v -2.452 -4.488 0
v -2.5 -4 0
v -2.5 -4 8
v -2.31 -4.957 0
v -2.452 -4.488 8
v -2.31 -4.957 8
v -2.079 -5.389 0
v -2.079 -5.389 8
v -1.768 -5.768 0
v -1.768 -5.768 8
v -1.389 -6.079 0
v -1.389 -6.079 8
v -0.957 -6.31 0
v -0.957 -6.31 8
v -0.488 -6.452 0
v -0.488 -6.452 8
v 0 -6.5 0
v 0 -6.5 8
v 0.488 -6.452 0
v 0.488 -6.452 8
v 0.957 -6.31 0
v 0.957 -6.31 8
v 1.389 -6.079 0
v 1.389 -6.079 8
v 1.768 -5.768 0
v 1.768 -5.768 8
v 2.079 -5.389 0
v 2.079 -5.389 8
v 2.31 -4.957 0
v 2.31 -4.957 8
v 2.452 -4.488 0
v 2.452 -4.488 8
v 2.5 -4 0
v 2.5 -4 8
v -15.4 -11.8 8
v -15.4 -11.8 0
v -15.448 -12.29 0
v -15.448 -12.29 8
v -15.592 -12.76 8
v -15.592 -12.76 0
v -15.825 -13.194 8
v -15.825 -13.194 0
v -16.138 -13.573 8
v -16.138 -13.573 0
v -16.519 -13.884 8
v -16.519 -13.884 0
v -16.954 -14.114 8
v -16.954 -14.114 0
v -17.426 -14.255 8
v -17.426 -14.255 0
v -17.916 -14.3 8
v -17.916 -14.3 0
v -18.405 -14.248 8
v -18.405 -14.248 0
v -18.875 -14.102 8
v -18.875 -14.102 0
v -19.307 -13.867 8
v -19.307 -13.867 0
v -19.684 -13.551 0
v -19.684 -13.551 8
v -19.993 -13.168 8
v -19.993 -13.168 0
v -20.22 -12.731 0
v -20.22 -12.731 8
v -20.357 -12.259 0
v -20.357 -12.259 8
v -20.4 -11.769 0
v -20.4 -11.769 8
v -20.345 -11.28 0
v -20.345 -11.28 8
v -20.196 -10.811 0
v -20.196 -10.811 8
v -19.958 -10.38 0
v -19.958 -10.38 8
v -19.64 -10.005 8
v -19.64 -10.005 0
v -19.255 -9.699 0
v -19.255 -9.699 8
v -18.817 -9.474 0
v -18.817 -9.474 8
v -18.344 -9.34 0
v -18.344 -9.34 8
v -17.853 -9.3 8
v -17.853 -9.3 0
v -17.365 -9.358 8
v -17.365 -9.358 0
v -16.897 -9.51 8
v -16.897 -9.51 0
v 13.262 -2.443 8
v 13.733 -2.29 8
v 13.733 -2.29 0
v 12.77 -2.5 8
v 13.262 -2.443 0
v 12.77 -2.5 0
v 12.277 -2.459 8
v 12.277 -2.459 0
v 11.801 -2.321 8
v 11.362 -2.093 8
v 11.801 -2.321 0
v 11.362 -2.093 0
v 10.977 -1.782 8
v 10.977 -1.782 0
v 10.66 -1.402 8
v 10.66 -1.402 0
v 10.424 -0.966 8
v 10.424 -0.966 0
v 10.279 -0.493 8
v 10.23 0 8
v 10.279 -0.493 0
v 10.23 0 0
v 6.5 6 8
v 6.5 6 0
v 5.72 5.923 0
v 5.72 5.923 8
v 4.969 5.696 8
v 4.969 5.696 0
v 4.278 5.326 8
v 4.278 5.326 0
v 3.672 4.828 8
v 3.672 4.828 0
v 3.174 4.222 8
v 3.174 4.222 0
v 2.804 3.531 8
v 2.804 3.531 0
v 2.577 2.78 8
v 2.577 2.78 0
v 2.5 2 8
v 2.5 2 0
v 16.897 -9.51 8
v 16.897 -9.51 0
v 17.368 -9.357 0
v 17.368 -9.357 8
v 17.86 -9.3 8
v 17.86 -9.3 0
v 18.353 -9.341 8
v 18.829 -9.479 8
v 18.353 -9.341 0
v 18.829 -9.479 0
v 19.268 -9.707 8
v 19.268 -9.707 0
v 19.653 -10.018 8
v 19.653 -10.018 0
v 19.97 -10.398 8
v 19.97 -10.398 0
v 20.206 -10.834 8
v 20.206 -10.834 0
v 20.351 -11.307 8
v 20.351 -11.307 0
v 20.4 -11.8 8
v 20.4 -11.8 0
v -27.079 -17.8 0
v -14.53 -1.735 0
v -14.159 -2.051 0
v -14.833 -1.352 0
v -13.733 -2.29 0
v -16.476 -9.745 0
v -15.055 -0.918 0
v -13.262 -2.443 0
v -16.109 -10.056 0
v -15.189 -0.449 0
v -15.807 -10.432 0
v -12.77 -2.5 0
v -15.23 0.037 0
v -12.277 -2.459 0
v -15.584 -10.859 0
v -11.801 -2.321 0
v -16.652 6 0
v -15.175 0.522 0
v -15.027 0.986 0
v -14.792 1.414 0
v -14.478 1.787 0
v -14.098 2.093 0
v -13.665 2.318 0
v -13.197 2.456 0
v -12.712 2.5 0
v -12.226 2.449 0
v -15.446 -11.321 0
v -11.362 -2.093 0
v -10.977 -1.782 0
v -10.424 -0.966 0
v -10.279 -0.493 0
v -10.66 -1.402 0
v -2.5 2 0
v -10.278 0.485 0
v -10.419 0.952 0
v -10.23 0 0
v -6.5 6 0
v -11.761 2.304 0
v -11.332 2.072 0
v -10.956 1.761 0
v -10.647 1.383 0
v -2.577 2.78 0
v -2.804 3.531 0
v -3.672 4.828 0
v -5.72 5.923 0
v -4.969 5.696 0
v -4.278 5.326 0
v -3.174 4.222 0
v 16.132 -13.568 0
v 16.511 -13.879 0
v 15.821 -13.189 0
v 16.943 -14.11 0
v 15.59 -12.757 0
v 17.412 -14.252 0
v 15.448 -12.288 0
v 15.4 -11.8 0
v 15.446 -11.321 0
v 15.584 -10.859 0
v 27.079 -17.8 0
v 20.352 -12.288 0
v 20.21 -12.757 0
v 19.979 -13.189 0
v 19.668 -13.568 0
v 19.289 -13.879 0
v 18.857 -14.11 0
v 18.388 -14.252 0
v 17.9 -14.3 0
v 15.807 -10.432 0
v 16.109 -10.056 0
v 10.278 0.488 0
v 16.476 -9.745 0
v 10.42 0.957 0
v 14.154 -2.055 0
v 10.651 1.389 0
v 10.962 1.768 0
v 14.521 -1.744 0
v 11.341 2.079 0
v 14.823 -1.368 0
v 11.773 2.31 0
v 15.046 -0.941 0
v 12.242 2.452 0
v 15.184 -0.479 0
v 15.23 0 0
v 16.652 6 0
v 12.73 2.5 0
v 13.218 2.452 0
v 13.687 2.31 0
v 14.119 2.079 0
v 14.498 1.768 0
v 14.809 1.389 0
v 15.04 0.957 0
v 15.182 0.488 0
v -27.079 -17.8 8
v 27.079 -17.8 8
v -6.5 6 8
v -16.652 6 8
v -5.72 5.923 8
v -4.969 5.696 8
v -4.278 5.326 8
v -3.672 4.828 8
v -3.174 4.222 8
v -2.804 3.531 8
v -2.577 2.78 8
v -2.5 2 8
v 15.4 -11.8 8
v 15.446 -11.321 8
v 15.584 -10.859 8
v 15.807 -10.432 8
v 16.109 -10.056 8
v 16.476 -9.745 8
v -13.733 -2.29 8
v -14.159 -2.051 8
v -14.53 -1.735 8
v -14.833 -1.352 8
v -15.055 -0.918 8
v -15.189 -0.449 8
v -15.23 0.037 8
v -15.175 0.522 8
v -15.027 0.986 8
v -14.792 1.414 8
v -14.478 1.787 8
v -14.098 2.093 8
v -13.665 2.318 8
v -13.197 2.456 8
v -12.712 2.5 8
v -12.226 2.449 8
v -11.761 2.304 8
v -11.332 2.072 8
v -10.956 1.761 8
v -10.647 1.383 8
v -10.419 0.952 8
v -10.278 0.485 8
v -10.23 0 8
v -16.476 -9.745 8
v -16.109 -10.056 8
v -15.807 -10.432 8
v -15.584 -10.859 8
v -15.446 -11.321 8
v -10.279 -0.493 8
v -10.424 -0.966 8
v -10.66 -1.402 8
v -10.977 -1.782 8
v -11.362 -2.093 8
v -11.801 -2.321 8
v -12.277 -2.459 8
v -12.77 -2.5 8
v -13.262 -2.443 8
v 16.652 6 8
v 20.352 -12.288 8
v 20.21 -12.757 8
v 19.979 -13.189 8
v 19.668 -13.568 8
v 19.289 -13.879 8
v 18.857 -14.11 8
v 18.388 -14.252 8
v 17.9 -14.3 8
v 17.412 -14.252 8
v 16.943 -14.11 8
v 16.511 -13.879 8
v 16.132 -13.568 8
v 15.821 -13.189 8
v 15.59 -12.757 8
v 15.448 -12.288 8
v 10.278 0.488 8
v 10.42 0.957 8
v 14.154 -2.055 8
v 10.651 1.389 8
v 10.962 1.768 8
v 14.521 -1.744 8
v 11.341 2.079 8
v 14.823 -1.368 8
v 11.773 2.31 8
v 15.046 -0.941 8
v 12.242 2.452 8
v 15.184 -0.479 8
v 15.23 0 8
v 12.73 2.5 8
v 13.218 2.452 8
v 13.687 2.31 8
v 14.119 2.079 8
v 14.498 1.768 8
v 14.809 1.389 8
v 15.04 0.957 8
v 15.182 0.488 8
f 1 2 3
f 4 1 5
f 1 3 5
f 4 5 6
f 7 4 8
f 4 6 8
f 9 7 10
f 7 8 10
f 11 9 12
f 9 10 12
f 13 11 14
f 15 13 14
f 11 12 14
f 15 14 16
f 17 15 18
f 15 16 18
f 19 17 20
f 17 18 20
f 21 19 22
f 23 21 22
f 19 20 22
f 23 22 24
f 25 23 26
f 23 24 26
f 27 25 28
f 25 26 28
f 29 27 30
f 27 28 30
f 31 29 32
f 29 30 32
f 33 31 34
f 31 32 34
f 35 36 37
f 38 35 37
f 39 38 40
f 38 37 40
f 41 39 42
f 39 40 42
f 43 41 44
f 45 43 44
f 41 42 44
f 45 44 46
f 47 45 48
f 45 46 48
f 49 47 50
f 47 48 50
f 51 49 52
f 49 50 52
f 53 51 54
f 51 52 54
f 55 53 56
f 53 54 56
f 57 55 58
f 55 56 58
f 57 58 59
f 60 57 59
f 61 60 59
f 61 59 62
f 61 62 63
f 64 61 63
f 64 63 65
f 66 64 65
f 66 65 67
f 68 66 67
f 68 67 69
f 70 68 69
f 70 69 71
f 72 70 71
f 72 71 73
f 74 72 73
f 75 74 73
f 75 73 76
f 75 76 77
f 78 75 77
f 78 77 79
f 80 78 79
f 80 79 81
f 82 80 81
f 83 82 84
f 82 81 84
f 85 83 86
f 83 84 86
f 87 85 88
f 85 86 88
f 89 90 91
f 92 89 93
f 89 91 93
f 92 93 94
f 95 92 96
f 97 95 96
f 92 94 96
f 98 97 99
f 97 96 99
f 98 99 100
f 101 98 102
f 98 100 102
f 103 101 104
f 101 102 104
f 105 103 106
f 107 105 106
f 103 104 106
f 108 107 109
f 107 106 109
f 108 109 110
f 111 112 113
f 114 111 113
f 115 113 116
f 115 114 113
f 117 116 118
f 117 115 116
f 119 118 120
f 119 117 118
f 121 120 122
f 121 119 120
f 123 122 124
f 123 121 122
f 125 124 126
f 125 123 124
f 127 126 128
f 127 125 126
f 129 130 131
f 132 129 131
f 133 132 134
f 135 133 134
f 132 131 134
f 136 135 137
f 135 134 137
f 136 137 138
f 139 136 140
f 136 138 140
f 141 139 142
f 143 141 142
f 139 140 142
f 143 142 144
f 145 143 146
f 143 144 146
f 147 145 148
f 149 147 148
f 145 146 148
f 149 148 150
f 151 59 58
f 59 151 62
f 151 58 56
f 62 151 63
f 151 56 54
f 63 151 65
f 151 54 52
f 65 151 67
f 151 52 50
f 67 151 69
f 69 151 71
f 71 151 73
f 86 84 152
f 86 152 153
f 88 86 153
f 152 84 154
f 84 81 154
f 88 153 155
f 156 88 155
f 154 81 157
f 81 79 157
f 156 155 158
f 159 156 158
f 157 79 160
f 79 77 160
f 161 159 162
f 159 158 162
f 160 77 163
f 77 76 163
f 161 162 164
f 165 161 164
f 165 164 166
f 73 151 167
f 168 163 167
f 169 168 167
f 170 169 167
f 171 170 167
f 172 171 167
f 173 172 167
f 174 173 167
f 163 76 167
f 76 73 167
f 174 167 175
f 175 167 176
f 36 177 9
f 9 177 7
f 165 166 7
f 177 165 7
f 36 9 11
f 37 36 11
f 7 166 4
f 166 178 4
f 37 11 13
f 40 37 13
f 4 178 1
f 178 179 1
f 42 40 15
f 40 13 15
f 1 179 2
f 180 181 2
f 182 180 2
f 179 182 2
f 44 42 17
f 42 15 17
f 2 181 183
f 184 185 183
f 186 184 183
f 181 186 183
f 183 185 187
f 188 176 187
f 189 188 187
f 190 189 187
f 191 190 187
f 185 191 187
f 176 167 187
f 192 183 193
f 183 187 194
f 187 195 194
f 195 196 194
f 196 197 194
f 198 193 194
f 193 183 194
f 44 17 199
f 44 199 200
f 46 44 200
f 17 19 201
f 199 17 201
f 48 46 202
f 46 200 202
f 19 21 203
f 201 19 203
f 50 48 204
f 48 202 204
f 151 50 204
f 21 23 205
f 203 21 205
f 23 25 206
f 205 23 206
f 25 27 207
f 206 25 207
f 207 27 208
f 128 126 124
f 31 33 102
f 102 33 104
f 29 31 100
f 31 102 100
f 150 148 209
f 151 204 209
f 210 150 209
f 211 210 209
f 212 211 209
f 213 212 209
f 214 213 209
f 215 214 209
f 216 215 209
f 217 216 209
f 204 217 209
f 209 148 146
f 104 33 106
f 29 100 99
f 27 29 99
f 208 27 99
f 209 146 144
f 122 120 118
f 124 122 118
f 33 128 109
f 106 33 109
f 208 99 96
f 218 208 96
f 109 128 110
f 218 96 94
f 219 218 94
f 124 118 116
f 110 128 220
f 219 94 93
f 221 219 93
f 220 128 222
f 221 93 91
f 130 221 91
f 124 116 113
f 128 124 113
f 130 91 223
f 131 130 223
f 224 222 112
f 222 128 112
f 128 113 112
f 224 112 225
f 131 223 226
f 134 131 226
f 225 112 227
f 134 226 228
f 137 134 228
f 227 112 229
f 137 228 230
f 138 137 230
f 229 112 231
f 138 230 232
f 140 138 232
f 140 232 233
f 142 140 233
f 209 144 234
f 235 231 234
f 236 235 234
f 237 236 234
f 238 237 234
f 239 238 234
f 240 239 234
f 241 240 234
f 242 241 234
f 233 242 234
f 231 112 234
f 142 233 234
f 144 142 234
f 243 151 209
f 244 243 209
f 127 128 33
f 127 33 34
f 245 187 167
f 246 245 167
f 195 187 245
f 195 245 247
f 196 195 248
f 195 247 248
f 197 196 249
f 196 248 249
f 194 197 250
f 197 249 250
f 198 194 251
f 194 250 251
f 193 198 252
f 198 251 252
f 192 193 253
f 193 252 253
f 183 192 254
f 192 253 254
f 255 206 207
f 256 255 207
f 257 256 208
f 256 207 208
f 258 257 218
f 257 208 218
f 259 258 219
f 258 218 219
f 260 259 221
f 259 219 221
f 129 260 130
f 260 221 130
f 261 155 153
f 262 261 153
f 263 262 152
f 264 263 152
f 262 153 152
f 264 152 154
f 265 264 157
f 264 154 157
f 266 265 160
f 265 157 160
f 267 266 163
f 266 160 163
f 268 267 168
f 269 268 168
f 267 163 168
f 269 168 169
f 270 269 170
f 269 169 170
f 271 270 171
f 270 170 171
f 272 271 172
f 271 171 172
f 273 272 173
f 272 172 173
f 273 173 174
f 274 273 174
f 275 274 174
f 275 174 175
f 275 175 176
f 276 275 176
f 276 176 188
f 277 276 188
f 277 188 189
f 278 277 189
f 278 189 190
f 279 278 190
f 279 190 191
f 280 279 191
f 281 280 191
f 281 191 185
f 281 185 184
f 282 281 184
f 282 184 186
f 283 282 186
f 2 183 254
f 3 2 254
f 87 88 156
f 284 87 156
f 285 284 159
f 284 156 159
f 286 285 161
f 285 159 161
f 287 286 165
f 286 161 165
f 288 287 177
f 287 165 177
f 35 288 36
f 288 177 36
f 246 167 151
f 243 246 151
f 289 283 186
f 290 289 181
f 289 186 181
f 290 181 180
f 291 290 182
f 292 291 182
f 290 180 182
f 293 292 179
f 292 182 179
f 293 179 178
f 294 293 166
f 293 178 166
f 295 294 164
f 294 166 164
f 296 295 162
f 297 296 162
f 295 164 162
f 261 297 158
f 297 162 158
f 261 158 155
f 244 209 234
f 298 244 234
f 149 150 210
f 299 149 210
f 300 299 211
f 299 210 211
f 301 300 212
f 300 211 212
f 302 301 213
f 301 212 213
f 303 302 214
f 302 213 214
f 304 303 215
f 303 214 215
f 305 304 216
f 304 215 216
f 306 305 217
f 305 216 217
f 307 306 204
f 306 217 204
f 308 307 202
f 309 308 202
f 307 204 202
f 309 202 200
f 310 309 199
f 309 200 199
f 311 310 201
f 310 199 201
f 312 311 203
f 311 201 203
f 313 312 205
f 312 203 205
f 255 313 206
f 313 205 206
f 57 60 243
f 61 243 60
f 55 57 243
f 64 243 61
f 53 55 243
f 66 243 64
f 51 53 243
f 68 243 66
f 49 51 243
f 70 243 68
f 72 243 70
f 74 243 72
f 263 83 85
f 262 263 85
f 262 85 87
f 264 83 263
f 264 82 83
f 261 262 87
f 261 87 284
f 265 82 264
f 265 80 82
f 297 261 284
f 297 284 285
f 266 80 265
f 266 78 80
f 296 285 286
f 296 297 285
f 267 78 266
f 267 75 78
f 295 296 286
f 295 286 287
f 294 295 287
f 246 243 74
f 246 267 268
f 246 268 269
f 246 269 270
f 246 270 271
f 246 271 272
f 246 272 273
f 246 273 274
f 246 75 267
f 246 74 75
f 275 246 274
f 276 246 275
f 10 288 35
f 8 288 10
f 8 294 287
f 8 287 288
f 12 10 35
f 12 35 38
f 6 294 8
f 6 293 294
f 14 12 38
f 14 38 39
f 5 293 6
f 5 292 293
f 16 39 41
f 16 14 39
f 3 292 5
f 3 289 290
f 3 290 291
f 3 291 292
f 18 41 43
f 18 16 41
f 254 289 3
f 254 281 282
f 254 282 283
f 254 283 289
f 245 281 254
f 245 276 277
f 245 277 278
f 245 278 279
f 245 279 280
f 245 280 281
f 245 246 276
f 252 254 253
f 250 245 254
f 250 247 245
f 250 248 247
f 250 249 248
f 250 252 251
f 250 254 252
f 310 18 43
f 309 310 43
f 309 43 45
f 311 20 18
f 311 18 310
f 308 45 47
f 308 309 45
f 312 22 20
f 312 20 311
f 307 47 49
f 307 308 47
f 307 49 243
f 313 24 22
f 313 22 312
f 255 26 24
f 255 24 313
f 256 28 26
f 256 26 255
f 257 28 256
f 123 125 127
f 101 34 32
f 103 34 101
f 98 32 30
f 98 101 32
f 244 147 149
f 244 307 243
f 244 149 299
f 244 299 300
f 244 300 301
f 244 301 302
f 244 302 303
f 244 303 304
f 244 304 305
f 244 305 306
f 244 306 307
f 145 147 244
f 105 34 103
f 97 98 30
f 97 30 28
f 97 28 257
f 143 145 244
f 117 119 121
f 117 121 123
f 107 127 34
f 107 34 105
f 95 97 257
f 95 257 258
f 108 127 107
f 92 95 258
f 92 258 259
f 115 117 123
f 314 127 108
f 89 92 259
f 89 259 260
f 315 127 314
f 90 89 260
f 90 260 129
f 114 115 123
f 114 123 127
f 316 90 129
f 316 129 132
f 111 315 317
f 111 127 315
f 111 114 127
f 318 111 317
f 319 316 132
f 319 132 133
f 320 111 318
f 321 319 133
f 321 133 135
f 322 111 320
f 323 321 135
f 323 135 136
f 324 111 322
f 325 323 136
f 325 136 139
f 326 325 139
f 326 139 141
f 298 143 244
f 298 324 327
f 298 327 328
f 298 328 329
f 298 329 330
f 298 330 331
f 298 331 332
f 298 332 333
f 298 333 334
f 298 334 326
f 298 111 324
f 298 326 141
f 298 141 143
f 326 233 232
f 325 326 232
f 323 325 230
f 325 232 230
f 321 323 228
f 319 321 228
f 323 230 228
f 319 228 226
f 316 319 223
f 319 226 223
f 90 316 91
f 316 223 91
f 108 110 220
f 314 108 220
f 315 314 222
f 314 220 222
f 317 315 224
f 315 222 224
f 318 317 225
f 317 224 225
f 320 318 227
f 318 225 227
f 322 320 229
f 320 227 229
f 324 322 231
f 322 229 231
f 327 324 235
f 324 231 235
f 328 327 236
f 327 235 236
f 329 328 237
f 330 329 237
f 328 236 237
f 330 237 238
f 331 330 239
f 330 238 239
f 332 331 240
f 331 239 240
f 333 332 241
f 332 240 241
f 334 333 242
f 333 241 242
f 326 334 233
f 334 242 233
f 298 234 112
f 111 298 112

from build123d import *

# Parameters (mm, degrees)
F1_DEPTH = 13
F2_W     = 5
F2_H     = 13
F3_DEPTH = 10
F5_DEPTH = 25
F6_R     = 4
F7_DEPTH = 5


with BuildPart() as f1:
    # F0 (on Top) → F1 (new body)
    with BuildSketch(Plane.XY):
        Polygon((16.6518093675, 6), (-16.6518093675, 6), (-27.0794364862, -17.8), (27.0794364862, -17.8), align=None)
        with BuildLine():
            Line((-16.8967314602, -9.5101414373), (-13.7332685398, -2.2898585627))
            ThreePointArc((-13.7332685398, -2.2898585627), (-14.0978137027, 2.0926265015), (-10.23, 0))
            Line((-10.23, 0), (10.23, 0))
            ThreePointArc((10.23, 0), (12.73, 2.5), (15.23, 0))
            ThreePointArc((15.23, 0), (14.8226265015, -1.3678137027), (13.7332685398, -2.2898585627))
            Line((13.7332685398, -2.2898585627), (16.8967314602, -9.5101414373))
            ThreePointArc((16.8967314602, -9.5101414373), (19.2678137027, -9.7073734985), (20.4, -11.8))
            ThreePointArc((20.4, -11.8), (17.9, -14.3), (15.4, -11.8))
            Line((15.4, -11.8), (-15.4, -11.8))
            ThreePointArc((-15.4, -11.8), (-19.9926265015, -13.1678137027), (-16.8967314602, -9.5101414373))
        make_face(mode=Mode.SUBTRACT)
        with BuildLine():
            ThreePointArc((-10.23, 0), (-11.3621862973, -2.0926265015), (-13.7332685398, -2.2898585627))
            Line((-13.7332685398, -2.2898585627), (-16.8967314602, -9.5101414373))
            ThreePointArc((-16.8967314602, -9.5101414373), (-15.8073734985, -10.4321862973), (-15.4, -11.8))
            Line((-15.4, -11.8), (15.4, -11.8))
            ThreePointArc((15.4, -11.8), (15.8073734985, -10.4321862973), (16.8967314602, -9.5101414373))
            Line((16.8967314602, -9.5101414373), (13.7332685398, -2.2898585627))
            ThreePointArc((13.7332685398, -2.2898585627), (11.3621862973, -2.0926265015), (10.23, 0))
            Line((10.23, 0), (-10.23, 0))
        make_face()
    extrude(amount=F1_DEPTH)

    # F2 (on face) → F3 (cut)
    with BuildSketch(Plane(origin=(0, 6, 0), x_dir=(-1, 0, 0), z_dir=(0, 1, 0))):
        with Locations((0, 6.5)):
            Rectangle(F2_W, F2_H)
    extrude(amount=-F3_DEPTH, mode=Mode.SUBTRACT)

    # F4 (on face) → F5 (cut)
    with BuildSketch(Plane.XY.offset(13)):
        with BuildLine():
            Line((2.5, -4), (-2.5, -4))
            ThreePointArc((-2.5, -4), (0, -6.5), (2.5, -4))
        make_face()
    extrude(amount=-F5_DEPTH, mode=Mode.SUBTRACT)

    # F6
    f6_edges = [f1.edges().sort_by_distance(p)[0] for p in [
        (2.5, 6, 6.5),
        (-2.5, 6, 6.5),
    ]]
    fillet(f6_edges, radius=F6_R)

    # F7 (cut): a face of the model
    f7_faces = [f1.faces().sort_by_distance(p)[0] for p in [
        (0, -7.4780389875, 13),
    ]]
    extrude(f7_faces, amount=-F7_DEPTH, mode=Mode.SUBTRACT)


solid = f1.part
